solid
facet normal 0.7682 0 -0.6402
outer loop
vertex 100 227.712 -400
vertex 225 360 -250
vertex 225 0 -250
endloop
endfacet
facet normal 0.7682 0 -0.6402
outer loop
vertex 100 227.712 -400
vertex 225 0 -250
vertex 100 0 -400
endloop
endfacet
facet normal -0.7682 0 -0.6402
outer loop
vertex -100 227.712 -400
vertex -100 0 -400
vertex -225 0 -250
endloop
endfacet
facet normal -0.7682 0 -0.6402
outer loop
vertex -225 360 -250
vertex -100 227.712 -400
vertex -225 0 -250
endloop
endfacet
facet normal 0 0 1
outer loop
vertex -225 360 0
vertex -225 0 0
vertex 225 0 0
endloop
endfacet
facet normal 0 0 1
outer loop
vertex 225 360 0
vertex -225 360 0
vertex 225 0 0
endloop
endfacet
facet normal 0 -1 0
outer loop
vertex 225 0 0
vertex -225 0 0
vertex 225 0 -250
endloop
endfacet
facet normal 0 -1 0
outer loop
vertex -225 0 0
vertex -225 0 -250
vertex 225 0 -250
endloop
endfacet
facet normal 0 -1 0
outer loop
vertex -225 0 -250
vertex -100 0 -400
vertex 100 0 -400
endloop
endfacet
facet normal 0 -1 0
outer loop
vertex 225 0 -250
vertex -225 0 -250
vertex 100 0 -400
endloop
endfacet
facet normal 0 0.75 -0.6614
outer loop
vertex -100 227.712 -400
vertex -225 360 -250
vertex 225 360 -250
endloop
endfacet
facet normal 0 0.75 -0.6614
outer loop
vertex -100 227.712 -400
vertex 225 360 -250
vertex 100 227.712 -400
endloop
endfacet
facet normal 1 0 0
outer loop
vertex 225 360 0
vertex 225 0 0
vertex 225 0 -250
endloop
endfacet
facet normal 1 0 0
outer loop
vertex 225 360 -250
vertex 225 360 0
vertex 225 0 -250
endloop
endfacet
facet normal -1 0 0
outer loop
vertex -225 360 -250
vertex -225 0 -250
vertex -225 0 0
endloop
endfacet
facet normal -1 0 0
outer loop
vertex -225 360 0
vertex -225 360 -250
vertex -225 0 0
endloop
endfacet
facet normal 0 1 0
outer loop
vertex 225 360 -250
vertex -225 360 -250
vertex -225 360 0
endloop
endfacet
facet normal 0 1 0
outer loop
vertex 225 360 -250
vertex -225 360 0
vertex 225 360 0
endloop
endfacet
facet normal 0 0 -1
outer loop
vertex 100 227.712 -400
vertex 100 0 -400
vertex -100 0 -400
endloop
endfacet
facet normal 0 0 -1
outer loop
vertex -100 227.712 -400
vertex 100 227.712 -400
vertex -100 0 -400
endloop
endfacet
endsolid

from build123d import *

# Parameters (mm, degrees)
EXTRUDE_1_DEPTH     = 360
CUT_EXTRUDE_1_DEPTH = 702.498396292


with BuildPart() as part:
    # 草图1 → 凸台-拉伸1 (new body)
    with BuildSketch(Plane(origin=(0, 0, 0), x_dir=(1, 0, 0), z_dir=(0, 1, 0))):
        Polygon((-225, 0), (225, 0), (225, 250), (100, 400), (-100, 400), (-225, 250), align=None)
    extrude(amount=EXTRUDE_1_DEPTH)

    # 草图2 → 切除-拉伸1 (cut, through all)
    with BuildSketch(Plane(origin=(225, 0, 0), x_dir=(0, 0, -1), z_dir=(1, 0, 0))):
        Polygon((250, 360), (400, 227.712434447), (400, 360), align=None)
    extrude(amount=-CUT_EXTRUDE_1_DEPTH, mode=Mode.SUBTRACT)


solid = part.part
